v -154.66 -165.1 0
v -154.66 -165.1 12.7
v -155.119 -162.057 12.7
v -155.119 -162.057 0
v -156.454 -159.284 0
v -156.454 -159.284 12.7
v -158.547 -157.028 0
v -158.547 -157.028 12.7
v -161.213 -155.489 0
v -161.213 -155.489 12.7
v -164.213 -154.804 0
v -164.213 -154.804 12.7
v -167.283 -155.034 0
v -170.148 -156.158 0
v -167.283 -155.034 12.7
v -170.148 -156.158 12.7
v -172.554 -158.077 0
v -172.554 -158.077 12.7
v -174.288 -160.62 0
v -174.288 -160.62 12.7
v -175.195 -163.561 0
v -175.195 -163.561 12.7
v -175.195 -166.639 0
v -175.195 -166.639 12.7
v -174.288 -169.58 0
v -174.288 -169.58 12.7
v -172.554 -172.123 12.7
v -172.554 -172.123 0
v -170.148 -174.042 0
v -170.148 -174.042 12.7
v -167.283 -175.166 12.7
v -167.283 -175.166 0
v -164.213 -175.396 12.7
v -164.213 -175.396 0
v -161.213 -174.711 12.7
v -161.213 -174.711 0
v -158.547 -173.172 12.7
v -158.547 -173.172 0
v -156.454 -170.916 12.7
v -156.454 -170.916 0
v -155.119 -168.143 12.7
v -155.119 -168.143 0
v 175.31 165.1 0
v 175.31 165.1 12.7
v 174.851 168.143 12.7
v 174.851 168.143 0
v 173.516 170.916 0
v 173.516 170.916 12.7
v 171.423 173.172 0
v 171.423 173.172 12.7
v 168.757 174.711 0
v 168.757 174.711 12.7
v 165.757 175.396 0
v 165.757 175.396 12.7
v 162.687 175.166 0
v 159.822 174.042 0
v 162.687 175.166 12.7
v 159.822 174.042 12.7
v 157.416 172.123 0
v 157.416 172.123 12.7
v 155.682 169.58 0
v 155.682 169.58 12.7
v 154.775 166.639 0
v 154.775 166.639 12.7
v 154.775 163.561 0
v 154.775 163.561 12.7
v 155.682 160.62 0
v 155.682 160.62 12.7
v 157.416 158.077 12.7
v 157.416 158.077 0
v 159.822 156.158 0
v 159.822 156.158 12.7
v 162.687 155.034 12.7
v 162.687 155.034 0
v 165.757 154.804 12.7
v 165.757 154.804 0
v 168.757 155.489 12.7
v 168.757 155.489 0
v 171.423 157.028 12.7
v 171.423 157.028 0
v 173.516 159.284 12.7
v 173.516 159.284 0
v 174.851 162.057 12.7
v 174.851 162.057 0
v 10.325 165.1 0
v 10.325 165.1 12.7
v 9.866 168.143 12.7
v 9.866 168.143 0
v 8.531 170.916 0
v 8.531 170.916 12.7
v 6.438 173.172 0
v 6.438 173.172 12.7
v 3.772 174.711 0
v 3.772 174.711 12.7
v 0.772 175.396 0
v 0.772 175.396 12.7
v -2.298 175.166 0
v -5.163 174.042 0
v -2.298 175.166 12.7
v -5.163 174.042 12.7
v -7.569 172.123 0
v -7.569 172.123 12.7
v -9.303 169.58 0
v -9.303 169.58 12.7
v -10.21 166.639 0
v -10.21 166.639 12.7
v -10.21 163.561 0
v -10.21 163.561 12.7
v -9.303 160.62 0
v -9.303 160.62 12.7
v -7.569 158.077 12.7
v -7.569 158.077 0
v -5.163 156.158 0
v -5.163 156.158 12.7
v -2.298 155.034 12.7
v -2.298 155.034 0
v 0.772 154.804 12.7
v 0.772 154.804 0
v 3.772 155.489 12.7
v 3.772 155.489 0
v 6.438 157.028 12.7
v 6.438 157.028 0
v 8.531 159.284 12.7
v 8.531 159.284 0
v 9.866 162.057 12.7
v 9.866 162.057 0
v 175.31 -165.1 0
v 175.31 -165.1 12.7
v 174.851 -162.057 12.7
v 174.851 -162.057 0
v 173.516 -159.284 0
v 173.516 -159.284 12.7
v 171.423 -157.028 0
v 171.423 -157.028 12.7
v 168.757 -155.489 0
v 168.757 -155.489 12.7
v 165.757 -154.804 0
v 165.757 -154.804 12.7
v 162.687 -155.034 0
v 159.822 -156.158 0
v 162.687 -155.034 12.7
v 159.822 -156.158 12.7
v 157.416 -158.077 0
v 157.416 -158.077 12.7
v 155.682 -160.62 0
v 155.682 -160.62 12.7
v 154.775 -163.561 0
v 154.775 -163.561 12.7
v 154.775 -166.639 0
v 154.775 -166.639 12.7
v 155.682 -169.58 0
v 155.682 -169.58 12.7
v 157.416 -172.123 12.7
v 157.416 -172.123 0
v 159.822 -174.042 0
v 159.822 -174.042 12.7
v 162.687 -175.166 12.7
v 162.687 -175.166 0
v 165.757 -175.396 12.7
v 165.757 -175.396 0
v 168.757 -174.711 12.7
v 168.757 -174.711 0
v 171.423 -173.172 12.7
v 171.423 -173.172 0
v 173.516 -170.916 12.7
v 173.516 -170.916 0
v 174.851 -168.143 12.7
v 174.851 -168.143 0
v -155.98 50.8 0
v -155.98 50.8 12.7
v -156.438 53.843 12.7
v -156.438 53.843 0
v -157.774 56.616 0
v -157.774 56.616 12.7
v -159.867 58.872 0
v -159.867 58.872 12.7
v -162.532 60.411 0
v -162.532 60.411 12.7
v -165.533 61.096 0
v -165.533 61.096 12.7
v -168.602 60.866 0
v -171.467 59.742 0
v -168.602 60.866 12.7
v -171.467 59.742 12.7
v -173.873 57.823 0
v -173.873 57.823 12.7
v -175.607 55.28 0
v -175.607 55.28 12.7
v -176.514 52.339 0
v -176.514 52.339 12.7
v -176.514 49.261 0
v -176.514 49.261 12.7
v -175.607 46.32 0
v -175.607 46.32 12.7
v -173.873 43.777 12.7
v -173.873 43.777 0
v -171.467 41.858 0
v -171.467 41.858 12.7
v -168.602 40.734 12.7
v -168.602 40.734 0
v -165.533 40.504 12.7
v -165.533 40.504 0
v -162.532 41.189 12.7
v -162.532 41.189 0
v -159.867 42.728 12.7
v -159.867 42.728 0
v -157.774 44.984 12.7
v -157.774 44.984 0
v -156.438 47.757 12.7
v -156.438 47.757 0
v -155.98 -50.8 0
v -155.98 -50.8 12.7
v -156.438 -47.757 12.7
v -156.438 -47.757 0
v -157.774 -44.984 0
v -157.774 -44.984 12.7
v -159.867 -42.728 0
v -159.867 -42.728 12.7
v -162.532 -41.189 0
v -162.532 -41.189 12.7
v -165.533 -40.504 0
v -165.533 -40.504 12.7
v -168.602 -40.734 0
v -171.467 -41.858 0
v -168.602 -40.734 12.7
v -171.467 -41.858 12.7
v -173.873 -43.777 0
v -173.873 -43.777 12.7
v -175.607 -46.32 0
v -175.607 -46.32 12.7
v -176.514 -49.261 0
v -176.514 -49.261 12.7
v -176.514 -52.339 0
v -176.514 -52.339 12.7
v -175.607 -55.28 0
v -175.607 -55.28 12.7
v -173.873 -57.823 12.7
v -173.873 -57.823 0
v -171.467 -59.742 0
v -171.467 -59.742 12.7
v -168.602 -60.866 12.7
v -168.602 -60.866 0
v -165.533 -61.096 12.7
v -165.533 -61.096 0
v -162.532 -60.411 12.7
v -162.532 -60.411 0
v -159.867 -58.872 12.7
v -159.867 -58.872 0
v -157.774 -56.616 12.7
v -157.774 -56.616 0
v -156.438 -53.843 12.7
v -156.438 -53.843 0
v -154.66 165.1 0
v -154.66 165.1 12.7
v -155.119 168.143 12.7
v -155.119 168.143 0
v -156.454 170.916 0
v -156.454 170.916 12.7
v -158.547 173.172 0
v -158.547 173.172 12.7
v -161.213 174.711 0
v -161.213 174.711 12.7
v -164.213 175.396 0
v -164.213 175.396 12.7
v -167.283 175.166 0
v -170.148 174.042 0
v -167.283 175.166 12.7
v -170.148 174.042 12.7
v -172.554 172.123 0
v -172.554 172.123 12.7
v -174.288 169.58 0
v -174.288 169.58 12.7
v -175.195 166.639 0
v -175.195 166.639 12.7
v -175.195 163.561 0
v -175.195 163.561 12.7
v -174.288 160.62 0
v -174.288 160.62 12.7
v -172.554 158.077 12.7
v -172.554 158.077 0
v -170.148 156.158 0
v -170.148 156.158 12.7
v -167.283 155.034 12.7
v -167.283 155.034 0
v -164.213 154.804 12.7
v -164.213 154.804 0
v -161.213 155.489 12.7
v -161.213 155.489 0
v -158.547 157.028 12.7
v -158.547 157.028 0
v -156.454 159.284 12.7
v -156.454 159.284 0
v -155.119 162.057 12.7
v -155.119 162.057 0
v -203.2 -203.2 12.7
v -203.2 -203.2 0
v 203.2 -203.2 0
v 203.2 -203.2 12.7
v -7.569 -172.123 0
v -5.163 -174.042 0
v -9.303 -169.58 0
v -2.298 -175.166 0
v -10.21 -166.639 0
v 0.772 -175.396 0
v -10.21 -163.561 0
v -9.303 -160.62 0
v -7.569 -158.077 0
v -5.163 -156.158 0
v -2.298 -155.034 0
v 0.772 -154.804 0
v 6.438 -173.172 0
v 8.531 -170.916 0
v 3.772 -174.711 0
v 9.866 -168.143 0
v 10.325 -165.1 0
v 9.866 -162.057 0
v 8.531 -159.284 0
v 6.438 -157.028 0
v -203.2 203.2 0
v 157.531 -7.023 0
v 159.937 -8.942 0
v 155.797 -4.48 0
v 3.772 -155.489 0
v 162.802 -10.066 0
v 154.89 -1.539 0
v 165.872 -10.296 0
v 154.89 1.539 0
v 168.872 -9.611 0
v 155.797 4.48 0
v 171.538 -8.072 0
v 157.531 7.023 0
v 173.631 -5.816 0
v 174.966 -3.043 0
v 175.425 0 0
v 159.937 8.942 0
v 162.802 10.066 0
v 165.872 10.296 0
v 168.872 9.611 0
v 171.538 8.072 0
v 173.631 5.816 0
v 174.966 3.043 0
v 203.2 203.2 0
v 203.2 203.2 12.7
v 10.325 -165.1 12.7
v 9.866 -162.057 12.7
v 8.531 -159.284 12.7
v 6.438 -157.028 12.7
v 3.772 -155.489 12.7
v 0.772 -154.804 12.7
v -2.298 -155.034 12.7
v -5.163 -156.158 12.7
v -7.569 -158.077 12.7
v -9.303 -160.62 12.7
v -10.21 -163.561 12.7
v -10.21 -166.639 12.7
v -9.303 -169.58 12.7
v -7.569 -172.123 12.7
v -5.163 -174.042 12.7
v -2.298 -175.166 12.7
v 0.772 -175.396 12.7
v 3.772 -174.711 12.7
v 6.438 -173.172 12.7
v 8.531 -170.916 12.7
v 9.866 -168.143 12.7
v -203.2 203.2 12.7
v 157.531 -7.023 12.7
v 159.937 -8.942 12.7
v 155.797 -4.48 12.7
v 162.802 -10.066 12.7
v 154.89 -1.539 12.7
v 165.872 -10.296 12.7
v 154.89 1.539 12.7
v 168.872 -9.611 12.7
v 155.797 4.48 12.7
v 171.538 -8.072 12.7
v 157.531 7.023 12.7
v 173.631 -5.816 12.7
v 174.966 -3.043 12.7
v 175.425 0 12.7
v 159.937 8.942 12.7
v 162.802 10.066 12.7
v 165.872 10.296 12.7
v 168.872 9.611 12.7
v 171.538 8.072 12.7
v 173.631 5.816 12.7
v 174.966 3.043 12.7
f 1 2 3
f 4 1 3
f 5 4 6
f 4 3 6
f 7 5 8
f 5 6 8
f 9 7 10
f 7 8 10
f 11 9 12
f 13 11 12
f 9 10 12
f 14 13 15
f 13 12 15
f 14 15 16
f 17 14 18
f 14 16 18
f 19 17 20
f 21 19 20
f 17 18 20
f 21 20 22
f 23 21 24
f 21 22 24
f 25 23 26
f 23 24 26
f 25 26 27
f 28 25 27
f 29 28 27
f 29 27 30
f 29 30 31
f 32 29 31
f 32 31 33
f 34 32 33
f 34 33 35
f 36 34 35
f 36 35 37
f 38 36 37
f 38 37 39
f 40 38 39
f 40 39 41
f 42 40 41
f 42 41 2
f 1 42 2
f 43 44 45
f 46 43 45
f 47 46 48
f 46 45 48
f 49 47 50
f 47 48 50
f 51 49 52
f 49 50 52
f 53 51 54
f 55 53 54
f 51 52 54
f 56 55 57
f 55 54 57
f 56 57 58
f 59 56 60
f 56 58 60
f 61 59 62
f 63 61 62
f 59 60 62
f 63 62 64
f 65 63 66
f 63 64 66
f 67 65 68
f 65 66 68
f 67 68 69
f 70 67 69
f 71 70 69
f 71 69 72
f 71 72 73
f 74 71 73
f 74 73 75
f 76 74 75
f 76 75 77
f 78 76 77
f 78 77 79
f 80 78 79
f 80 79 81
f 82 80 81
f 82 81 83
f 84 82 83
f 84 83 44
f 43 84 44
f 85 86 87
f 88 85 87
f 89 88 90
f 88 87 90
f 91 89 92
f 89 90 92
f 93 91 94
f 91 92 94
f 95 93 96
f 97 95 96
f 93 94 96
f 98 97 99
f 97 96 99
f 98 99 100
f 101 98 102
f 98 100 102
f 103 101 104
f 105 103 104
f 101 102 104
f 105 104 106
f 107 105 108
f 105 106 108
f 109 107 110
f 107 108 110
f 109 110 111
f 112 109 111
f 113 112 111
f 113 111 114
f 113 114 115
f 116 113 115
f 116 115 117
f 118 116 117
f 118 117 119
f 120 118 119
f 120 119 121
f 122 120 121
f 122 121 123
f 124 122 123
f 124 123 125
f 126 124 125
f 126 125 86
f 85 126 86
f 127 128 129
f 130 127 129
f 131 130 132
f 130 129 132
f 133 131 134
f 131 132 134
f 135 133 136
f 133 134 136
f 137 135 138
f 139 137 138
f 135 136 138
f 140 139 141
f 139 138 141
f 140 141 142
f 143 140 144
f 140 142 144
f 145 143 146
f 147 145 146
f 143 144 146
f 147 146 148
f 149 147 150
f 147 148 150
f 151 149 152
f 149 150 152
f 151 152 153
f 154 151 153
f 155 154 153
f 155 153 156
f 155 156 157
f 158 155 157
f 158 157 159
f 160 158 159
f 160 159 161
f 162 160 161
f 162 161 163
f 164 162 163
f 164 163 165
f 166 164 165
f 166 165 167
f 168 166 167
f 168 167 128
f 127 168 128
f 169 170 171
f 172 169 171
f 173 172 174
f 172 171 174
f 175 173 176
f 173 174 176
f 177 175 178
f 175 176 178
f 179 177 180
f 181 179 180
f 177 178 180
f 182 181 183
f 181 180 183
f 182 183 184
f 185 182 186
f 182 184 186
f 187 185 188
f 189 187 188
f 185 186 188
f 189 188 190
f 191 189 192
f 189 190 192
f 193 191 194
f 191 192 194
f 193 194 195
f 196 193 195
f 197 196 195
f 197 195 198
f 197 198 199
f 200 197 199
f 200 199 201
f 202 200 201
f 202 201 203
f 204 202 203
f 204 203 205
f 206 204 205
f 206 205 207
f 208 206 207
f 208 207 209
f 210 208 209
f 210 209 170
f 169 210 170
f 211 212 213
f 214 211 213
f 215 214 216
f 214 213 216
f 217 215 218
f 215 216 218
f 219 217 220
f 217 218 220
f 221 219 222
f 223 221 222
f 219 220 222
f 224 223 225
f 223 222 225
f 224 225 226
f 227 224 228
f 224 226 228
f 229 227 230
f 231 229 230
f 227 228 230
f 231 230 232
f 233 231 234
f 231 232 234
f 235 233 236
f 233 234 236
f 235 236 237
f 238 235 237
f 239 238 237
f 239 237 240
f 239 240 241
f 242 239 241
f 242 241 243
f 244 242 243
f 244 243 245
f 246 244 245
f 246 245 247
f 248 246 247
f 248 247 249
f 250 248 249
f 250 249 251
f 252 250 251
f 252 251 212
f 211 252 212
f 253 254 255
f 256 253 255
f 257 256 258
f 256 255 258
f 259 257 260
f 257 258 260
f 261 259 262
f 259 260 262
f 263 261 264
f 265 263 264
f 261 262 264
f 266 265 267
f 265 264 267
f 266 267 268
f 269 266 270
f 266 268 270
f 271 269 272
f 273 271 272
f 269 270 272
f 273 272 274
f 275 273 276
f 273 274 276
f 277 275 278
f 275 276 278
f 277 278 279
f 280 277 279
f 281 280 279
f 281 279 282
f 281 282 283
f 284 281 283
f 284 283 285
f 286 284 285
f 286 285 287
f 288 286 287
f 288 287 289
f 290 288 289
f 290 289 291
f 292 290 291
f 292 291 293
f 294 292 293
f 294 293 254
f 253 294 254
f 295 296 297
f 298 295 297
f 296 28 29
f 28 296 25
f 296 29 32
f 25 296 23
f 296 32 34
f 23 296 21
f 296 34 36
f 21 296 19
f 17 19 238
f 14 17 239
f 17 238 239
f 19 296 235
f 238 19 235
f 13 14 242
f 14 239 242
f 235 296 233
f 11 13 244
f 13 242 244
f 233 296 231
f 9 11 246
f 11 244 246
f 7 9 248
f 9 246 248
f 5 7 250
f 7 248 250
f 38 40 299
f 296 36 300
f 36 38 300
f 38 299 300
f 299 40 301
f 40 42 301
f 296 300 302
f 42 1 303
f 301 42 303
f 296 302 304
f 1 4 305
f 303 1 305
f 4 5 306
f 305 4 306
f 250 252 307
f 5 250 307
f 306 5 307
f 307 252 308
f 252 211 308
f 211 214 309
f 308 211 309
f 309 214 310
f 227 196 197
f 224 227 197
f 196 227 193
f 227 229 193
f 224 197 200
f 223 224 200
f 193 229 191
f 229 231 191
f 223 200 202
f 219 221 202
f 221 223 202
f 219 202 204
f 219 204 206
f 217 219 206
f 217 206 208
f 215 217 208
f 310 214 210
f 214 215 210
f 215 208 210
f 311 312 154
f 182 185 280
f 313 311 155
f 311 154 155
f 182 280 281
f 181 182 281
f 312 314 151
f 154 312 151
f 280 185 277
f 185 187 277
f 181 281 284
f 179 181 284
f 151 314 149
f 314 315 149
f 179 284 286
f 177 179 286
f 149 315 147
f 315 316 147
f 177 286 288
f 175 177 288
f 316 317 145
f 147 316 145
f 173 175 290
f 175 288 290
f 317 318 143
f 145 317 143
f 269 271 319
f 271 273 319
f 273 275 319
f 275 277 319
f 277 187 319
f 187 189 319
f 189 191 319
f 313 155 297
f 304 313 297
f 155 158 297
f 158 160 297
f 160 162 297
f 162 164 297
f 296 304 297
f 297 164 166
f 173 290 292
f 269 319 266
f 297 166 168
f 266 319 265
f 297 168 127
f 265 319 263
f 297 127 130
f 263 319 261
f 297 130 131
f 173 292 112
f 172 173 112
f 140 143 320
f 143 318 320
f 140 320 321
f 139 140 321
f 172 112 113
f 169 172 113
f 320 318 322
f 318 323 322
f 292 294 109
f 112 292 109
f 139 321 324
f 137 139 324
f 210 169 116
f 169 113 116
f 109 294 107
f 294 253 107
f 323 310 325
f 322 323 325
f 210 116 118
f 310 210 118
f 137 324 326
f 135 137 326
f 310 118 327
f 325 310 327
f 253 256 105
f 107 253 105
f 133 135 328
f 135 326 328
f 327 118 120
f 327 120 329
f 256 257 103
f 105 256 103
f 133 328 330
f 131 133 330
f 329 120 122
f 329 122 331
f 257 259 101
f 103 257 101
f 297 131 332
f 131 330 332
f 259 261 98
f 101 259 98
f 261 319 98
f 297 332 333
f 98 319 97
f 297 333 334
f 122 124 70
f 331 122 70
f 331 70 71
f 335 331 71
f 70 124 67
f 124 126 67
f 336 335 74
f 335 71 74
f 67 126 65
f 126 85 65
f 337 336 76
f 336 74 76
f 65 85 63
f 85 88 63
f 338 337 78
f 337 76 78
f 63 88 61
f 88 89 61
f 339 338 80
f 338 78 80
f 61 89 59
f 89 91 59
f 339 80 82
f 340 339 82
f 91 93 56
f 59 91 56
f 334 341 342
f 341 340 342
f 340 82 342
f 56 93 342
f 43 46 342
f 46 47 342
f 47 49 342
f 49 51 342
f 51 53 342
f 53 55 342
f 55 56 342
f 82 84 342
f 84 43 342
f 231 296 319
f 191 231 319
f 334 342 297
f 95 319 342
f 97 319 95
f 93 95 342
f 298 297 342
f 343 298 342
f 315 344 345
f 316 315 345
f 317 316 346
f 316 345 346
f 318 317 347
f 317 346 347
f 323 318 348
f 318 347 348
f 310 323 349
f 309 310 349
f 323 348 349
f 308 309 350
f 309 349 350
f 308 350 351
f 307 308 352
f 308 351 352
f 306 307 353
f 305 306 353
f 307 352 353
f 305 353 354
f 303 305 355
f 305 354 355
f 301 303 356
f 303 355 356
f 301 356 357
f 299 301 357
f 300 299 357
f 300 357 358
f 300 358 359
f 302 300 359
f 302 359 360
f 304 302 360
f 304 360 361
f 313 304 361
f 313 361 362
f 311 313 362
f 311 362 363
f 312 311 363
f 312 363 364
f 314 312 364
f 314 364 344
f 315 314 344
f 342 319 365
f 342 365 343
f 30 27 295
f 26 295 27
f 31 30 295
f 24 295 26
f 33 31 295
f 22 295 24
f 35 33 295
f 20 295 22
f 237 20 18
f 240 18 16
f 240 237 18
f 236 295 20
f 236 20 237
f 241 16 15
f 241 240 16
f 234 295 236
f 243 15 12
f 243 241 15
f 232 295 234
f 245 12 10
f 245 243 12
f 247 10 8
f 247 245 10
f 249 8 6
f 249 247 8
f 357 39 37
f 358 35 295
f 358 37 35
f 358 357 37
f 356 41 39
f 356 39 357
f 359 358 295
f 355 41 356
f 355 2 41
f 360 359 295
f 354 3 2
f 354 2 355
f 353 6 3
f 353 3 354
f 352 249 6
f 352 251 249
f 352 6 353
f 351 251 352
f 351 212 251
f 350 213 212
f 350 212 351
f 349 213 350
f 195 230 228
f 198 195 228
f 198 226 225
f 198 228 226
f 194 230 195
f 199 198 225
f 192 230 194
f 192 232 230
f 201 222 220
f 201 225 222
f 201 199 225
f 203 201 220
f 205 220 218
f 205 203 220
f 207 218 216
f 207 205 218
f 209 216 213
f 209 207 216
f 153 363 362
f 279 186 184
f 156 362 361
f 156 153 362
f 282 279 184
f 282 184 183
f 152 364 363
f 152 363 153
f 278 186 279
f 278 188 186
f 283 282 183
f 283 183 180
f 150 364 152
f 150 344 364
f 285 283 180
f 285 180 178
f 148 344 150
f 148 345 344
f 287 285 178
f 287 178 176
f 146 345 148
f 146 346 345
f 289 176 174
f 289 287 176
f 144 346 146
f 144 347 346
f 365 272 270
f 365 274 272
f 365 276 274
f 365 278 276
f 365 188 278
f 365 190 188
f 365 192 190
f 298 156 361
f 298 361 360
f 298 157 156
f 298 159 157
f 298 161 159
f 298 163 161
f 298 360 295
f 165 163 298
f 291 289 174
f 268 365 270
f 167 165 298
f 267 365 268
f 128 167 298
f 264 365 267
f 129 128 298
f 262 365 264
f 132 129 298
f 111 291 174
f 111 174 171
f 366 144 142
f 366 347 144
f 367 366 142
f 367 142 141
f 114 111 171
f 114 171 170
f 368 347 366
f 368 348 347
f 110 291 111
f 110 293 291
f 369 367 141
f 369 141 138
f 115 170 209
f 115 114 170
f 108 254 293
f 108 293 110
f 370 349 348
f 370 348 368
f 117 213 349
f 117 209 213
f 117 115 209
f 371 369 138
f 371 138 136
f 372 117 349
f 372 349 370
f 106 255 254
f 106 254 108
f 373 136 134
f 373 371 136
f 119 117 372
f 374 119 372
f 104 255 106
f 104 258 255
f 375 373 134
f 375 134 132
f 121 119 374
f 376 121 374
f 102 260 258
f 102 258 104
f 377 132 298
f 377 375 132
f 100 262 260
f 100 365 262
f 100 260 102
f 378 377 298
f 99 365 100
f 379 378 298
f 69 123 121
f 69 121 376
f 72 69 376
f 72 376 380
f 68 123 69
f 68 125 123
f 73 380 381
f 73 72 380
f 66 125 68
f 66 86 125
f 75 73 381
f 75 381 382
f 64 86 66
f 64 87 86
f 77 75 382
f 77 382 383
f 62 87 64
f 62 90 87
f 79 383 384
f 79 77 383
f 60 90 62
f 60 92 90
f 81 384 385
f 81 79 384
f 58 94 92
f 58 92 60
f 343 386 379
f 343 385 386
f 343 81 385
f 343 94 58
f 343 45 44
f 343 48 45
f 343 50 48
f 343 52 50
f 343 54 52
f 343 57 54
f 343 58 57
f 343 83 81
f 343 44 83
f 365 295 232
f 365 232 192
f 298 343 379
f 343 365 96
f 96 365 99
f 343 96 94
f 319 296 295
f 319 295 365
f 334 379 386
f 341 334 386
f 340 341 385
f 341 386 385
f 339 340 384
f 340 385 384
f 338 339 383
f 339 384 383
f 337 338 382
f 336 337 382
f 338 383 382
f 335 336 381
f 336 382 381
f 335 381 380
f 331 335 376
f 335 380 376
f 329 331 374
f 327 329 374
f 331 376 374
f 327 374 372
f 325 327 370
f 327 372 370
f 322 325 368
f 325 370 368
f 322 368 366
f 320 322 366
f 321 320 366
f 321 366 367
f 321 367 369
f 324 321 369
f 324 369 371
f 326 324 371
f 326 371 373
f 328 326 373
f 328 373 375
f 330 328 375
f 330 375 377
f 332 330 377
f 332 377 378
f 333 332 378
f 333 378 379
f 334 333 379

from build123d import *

# Parameters (mm, degrees)
F0_W     = 406.4
F0_H     = 406.4
F1_DEPTH = 12.7
F2_R     = 10.3251
F3_DEPTH = 25.4


with BuildPart() as f1:
    # F0 (on Top) → F1 (new body)
    with BuildSketch(Plane.XY):
        Rectangle(F0_W, F0_H)
    extrude(amount=F1_DEPTH)

    # F2 (on face) → F3 (cut)
    with BuildSketch(Plane.XY.offset(12.7)):
        with Locations((-164.984982, 165.1)):
            Circle(F2_R)
        with Locations((-166.304624, 50.8)):
            Circle(F2_R)
        with Locations((-166.304624, -50.8)):
            Circle(F2_R)
        with Locations((-164.984982, -165.1)):
            Circle(F2_R)
        with Locations((164.984982, 165.1)):
            Circle(F2_R)
        with Locations((164.984982, -165.1)):
            Circle(F2_R)
        with Locations((165.1, 0)):
            Circle(F2_R)
        with Locations((0, 165.1)):
            Circle(F2_R)
        with Locations((0, -165.1)):
            Circle(F2_R)
    extrude(amount=-F3_DEPTH, mode=Mode.SUBTRACT)


solid = f1.part
